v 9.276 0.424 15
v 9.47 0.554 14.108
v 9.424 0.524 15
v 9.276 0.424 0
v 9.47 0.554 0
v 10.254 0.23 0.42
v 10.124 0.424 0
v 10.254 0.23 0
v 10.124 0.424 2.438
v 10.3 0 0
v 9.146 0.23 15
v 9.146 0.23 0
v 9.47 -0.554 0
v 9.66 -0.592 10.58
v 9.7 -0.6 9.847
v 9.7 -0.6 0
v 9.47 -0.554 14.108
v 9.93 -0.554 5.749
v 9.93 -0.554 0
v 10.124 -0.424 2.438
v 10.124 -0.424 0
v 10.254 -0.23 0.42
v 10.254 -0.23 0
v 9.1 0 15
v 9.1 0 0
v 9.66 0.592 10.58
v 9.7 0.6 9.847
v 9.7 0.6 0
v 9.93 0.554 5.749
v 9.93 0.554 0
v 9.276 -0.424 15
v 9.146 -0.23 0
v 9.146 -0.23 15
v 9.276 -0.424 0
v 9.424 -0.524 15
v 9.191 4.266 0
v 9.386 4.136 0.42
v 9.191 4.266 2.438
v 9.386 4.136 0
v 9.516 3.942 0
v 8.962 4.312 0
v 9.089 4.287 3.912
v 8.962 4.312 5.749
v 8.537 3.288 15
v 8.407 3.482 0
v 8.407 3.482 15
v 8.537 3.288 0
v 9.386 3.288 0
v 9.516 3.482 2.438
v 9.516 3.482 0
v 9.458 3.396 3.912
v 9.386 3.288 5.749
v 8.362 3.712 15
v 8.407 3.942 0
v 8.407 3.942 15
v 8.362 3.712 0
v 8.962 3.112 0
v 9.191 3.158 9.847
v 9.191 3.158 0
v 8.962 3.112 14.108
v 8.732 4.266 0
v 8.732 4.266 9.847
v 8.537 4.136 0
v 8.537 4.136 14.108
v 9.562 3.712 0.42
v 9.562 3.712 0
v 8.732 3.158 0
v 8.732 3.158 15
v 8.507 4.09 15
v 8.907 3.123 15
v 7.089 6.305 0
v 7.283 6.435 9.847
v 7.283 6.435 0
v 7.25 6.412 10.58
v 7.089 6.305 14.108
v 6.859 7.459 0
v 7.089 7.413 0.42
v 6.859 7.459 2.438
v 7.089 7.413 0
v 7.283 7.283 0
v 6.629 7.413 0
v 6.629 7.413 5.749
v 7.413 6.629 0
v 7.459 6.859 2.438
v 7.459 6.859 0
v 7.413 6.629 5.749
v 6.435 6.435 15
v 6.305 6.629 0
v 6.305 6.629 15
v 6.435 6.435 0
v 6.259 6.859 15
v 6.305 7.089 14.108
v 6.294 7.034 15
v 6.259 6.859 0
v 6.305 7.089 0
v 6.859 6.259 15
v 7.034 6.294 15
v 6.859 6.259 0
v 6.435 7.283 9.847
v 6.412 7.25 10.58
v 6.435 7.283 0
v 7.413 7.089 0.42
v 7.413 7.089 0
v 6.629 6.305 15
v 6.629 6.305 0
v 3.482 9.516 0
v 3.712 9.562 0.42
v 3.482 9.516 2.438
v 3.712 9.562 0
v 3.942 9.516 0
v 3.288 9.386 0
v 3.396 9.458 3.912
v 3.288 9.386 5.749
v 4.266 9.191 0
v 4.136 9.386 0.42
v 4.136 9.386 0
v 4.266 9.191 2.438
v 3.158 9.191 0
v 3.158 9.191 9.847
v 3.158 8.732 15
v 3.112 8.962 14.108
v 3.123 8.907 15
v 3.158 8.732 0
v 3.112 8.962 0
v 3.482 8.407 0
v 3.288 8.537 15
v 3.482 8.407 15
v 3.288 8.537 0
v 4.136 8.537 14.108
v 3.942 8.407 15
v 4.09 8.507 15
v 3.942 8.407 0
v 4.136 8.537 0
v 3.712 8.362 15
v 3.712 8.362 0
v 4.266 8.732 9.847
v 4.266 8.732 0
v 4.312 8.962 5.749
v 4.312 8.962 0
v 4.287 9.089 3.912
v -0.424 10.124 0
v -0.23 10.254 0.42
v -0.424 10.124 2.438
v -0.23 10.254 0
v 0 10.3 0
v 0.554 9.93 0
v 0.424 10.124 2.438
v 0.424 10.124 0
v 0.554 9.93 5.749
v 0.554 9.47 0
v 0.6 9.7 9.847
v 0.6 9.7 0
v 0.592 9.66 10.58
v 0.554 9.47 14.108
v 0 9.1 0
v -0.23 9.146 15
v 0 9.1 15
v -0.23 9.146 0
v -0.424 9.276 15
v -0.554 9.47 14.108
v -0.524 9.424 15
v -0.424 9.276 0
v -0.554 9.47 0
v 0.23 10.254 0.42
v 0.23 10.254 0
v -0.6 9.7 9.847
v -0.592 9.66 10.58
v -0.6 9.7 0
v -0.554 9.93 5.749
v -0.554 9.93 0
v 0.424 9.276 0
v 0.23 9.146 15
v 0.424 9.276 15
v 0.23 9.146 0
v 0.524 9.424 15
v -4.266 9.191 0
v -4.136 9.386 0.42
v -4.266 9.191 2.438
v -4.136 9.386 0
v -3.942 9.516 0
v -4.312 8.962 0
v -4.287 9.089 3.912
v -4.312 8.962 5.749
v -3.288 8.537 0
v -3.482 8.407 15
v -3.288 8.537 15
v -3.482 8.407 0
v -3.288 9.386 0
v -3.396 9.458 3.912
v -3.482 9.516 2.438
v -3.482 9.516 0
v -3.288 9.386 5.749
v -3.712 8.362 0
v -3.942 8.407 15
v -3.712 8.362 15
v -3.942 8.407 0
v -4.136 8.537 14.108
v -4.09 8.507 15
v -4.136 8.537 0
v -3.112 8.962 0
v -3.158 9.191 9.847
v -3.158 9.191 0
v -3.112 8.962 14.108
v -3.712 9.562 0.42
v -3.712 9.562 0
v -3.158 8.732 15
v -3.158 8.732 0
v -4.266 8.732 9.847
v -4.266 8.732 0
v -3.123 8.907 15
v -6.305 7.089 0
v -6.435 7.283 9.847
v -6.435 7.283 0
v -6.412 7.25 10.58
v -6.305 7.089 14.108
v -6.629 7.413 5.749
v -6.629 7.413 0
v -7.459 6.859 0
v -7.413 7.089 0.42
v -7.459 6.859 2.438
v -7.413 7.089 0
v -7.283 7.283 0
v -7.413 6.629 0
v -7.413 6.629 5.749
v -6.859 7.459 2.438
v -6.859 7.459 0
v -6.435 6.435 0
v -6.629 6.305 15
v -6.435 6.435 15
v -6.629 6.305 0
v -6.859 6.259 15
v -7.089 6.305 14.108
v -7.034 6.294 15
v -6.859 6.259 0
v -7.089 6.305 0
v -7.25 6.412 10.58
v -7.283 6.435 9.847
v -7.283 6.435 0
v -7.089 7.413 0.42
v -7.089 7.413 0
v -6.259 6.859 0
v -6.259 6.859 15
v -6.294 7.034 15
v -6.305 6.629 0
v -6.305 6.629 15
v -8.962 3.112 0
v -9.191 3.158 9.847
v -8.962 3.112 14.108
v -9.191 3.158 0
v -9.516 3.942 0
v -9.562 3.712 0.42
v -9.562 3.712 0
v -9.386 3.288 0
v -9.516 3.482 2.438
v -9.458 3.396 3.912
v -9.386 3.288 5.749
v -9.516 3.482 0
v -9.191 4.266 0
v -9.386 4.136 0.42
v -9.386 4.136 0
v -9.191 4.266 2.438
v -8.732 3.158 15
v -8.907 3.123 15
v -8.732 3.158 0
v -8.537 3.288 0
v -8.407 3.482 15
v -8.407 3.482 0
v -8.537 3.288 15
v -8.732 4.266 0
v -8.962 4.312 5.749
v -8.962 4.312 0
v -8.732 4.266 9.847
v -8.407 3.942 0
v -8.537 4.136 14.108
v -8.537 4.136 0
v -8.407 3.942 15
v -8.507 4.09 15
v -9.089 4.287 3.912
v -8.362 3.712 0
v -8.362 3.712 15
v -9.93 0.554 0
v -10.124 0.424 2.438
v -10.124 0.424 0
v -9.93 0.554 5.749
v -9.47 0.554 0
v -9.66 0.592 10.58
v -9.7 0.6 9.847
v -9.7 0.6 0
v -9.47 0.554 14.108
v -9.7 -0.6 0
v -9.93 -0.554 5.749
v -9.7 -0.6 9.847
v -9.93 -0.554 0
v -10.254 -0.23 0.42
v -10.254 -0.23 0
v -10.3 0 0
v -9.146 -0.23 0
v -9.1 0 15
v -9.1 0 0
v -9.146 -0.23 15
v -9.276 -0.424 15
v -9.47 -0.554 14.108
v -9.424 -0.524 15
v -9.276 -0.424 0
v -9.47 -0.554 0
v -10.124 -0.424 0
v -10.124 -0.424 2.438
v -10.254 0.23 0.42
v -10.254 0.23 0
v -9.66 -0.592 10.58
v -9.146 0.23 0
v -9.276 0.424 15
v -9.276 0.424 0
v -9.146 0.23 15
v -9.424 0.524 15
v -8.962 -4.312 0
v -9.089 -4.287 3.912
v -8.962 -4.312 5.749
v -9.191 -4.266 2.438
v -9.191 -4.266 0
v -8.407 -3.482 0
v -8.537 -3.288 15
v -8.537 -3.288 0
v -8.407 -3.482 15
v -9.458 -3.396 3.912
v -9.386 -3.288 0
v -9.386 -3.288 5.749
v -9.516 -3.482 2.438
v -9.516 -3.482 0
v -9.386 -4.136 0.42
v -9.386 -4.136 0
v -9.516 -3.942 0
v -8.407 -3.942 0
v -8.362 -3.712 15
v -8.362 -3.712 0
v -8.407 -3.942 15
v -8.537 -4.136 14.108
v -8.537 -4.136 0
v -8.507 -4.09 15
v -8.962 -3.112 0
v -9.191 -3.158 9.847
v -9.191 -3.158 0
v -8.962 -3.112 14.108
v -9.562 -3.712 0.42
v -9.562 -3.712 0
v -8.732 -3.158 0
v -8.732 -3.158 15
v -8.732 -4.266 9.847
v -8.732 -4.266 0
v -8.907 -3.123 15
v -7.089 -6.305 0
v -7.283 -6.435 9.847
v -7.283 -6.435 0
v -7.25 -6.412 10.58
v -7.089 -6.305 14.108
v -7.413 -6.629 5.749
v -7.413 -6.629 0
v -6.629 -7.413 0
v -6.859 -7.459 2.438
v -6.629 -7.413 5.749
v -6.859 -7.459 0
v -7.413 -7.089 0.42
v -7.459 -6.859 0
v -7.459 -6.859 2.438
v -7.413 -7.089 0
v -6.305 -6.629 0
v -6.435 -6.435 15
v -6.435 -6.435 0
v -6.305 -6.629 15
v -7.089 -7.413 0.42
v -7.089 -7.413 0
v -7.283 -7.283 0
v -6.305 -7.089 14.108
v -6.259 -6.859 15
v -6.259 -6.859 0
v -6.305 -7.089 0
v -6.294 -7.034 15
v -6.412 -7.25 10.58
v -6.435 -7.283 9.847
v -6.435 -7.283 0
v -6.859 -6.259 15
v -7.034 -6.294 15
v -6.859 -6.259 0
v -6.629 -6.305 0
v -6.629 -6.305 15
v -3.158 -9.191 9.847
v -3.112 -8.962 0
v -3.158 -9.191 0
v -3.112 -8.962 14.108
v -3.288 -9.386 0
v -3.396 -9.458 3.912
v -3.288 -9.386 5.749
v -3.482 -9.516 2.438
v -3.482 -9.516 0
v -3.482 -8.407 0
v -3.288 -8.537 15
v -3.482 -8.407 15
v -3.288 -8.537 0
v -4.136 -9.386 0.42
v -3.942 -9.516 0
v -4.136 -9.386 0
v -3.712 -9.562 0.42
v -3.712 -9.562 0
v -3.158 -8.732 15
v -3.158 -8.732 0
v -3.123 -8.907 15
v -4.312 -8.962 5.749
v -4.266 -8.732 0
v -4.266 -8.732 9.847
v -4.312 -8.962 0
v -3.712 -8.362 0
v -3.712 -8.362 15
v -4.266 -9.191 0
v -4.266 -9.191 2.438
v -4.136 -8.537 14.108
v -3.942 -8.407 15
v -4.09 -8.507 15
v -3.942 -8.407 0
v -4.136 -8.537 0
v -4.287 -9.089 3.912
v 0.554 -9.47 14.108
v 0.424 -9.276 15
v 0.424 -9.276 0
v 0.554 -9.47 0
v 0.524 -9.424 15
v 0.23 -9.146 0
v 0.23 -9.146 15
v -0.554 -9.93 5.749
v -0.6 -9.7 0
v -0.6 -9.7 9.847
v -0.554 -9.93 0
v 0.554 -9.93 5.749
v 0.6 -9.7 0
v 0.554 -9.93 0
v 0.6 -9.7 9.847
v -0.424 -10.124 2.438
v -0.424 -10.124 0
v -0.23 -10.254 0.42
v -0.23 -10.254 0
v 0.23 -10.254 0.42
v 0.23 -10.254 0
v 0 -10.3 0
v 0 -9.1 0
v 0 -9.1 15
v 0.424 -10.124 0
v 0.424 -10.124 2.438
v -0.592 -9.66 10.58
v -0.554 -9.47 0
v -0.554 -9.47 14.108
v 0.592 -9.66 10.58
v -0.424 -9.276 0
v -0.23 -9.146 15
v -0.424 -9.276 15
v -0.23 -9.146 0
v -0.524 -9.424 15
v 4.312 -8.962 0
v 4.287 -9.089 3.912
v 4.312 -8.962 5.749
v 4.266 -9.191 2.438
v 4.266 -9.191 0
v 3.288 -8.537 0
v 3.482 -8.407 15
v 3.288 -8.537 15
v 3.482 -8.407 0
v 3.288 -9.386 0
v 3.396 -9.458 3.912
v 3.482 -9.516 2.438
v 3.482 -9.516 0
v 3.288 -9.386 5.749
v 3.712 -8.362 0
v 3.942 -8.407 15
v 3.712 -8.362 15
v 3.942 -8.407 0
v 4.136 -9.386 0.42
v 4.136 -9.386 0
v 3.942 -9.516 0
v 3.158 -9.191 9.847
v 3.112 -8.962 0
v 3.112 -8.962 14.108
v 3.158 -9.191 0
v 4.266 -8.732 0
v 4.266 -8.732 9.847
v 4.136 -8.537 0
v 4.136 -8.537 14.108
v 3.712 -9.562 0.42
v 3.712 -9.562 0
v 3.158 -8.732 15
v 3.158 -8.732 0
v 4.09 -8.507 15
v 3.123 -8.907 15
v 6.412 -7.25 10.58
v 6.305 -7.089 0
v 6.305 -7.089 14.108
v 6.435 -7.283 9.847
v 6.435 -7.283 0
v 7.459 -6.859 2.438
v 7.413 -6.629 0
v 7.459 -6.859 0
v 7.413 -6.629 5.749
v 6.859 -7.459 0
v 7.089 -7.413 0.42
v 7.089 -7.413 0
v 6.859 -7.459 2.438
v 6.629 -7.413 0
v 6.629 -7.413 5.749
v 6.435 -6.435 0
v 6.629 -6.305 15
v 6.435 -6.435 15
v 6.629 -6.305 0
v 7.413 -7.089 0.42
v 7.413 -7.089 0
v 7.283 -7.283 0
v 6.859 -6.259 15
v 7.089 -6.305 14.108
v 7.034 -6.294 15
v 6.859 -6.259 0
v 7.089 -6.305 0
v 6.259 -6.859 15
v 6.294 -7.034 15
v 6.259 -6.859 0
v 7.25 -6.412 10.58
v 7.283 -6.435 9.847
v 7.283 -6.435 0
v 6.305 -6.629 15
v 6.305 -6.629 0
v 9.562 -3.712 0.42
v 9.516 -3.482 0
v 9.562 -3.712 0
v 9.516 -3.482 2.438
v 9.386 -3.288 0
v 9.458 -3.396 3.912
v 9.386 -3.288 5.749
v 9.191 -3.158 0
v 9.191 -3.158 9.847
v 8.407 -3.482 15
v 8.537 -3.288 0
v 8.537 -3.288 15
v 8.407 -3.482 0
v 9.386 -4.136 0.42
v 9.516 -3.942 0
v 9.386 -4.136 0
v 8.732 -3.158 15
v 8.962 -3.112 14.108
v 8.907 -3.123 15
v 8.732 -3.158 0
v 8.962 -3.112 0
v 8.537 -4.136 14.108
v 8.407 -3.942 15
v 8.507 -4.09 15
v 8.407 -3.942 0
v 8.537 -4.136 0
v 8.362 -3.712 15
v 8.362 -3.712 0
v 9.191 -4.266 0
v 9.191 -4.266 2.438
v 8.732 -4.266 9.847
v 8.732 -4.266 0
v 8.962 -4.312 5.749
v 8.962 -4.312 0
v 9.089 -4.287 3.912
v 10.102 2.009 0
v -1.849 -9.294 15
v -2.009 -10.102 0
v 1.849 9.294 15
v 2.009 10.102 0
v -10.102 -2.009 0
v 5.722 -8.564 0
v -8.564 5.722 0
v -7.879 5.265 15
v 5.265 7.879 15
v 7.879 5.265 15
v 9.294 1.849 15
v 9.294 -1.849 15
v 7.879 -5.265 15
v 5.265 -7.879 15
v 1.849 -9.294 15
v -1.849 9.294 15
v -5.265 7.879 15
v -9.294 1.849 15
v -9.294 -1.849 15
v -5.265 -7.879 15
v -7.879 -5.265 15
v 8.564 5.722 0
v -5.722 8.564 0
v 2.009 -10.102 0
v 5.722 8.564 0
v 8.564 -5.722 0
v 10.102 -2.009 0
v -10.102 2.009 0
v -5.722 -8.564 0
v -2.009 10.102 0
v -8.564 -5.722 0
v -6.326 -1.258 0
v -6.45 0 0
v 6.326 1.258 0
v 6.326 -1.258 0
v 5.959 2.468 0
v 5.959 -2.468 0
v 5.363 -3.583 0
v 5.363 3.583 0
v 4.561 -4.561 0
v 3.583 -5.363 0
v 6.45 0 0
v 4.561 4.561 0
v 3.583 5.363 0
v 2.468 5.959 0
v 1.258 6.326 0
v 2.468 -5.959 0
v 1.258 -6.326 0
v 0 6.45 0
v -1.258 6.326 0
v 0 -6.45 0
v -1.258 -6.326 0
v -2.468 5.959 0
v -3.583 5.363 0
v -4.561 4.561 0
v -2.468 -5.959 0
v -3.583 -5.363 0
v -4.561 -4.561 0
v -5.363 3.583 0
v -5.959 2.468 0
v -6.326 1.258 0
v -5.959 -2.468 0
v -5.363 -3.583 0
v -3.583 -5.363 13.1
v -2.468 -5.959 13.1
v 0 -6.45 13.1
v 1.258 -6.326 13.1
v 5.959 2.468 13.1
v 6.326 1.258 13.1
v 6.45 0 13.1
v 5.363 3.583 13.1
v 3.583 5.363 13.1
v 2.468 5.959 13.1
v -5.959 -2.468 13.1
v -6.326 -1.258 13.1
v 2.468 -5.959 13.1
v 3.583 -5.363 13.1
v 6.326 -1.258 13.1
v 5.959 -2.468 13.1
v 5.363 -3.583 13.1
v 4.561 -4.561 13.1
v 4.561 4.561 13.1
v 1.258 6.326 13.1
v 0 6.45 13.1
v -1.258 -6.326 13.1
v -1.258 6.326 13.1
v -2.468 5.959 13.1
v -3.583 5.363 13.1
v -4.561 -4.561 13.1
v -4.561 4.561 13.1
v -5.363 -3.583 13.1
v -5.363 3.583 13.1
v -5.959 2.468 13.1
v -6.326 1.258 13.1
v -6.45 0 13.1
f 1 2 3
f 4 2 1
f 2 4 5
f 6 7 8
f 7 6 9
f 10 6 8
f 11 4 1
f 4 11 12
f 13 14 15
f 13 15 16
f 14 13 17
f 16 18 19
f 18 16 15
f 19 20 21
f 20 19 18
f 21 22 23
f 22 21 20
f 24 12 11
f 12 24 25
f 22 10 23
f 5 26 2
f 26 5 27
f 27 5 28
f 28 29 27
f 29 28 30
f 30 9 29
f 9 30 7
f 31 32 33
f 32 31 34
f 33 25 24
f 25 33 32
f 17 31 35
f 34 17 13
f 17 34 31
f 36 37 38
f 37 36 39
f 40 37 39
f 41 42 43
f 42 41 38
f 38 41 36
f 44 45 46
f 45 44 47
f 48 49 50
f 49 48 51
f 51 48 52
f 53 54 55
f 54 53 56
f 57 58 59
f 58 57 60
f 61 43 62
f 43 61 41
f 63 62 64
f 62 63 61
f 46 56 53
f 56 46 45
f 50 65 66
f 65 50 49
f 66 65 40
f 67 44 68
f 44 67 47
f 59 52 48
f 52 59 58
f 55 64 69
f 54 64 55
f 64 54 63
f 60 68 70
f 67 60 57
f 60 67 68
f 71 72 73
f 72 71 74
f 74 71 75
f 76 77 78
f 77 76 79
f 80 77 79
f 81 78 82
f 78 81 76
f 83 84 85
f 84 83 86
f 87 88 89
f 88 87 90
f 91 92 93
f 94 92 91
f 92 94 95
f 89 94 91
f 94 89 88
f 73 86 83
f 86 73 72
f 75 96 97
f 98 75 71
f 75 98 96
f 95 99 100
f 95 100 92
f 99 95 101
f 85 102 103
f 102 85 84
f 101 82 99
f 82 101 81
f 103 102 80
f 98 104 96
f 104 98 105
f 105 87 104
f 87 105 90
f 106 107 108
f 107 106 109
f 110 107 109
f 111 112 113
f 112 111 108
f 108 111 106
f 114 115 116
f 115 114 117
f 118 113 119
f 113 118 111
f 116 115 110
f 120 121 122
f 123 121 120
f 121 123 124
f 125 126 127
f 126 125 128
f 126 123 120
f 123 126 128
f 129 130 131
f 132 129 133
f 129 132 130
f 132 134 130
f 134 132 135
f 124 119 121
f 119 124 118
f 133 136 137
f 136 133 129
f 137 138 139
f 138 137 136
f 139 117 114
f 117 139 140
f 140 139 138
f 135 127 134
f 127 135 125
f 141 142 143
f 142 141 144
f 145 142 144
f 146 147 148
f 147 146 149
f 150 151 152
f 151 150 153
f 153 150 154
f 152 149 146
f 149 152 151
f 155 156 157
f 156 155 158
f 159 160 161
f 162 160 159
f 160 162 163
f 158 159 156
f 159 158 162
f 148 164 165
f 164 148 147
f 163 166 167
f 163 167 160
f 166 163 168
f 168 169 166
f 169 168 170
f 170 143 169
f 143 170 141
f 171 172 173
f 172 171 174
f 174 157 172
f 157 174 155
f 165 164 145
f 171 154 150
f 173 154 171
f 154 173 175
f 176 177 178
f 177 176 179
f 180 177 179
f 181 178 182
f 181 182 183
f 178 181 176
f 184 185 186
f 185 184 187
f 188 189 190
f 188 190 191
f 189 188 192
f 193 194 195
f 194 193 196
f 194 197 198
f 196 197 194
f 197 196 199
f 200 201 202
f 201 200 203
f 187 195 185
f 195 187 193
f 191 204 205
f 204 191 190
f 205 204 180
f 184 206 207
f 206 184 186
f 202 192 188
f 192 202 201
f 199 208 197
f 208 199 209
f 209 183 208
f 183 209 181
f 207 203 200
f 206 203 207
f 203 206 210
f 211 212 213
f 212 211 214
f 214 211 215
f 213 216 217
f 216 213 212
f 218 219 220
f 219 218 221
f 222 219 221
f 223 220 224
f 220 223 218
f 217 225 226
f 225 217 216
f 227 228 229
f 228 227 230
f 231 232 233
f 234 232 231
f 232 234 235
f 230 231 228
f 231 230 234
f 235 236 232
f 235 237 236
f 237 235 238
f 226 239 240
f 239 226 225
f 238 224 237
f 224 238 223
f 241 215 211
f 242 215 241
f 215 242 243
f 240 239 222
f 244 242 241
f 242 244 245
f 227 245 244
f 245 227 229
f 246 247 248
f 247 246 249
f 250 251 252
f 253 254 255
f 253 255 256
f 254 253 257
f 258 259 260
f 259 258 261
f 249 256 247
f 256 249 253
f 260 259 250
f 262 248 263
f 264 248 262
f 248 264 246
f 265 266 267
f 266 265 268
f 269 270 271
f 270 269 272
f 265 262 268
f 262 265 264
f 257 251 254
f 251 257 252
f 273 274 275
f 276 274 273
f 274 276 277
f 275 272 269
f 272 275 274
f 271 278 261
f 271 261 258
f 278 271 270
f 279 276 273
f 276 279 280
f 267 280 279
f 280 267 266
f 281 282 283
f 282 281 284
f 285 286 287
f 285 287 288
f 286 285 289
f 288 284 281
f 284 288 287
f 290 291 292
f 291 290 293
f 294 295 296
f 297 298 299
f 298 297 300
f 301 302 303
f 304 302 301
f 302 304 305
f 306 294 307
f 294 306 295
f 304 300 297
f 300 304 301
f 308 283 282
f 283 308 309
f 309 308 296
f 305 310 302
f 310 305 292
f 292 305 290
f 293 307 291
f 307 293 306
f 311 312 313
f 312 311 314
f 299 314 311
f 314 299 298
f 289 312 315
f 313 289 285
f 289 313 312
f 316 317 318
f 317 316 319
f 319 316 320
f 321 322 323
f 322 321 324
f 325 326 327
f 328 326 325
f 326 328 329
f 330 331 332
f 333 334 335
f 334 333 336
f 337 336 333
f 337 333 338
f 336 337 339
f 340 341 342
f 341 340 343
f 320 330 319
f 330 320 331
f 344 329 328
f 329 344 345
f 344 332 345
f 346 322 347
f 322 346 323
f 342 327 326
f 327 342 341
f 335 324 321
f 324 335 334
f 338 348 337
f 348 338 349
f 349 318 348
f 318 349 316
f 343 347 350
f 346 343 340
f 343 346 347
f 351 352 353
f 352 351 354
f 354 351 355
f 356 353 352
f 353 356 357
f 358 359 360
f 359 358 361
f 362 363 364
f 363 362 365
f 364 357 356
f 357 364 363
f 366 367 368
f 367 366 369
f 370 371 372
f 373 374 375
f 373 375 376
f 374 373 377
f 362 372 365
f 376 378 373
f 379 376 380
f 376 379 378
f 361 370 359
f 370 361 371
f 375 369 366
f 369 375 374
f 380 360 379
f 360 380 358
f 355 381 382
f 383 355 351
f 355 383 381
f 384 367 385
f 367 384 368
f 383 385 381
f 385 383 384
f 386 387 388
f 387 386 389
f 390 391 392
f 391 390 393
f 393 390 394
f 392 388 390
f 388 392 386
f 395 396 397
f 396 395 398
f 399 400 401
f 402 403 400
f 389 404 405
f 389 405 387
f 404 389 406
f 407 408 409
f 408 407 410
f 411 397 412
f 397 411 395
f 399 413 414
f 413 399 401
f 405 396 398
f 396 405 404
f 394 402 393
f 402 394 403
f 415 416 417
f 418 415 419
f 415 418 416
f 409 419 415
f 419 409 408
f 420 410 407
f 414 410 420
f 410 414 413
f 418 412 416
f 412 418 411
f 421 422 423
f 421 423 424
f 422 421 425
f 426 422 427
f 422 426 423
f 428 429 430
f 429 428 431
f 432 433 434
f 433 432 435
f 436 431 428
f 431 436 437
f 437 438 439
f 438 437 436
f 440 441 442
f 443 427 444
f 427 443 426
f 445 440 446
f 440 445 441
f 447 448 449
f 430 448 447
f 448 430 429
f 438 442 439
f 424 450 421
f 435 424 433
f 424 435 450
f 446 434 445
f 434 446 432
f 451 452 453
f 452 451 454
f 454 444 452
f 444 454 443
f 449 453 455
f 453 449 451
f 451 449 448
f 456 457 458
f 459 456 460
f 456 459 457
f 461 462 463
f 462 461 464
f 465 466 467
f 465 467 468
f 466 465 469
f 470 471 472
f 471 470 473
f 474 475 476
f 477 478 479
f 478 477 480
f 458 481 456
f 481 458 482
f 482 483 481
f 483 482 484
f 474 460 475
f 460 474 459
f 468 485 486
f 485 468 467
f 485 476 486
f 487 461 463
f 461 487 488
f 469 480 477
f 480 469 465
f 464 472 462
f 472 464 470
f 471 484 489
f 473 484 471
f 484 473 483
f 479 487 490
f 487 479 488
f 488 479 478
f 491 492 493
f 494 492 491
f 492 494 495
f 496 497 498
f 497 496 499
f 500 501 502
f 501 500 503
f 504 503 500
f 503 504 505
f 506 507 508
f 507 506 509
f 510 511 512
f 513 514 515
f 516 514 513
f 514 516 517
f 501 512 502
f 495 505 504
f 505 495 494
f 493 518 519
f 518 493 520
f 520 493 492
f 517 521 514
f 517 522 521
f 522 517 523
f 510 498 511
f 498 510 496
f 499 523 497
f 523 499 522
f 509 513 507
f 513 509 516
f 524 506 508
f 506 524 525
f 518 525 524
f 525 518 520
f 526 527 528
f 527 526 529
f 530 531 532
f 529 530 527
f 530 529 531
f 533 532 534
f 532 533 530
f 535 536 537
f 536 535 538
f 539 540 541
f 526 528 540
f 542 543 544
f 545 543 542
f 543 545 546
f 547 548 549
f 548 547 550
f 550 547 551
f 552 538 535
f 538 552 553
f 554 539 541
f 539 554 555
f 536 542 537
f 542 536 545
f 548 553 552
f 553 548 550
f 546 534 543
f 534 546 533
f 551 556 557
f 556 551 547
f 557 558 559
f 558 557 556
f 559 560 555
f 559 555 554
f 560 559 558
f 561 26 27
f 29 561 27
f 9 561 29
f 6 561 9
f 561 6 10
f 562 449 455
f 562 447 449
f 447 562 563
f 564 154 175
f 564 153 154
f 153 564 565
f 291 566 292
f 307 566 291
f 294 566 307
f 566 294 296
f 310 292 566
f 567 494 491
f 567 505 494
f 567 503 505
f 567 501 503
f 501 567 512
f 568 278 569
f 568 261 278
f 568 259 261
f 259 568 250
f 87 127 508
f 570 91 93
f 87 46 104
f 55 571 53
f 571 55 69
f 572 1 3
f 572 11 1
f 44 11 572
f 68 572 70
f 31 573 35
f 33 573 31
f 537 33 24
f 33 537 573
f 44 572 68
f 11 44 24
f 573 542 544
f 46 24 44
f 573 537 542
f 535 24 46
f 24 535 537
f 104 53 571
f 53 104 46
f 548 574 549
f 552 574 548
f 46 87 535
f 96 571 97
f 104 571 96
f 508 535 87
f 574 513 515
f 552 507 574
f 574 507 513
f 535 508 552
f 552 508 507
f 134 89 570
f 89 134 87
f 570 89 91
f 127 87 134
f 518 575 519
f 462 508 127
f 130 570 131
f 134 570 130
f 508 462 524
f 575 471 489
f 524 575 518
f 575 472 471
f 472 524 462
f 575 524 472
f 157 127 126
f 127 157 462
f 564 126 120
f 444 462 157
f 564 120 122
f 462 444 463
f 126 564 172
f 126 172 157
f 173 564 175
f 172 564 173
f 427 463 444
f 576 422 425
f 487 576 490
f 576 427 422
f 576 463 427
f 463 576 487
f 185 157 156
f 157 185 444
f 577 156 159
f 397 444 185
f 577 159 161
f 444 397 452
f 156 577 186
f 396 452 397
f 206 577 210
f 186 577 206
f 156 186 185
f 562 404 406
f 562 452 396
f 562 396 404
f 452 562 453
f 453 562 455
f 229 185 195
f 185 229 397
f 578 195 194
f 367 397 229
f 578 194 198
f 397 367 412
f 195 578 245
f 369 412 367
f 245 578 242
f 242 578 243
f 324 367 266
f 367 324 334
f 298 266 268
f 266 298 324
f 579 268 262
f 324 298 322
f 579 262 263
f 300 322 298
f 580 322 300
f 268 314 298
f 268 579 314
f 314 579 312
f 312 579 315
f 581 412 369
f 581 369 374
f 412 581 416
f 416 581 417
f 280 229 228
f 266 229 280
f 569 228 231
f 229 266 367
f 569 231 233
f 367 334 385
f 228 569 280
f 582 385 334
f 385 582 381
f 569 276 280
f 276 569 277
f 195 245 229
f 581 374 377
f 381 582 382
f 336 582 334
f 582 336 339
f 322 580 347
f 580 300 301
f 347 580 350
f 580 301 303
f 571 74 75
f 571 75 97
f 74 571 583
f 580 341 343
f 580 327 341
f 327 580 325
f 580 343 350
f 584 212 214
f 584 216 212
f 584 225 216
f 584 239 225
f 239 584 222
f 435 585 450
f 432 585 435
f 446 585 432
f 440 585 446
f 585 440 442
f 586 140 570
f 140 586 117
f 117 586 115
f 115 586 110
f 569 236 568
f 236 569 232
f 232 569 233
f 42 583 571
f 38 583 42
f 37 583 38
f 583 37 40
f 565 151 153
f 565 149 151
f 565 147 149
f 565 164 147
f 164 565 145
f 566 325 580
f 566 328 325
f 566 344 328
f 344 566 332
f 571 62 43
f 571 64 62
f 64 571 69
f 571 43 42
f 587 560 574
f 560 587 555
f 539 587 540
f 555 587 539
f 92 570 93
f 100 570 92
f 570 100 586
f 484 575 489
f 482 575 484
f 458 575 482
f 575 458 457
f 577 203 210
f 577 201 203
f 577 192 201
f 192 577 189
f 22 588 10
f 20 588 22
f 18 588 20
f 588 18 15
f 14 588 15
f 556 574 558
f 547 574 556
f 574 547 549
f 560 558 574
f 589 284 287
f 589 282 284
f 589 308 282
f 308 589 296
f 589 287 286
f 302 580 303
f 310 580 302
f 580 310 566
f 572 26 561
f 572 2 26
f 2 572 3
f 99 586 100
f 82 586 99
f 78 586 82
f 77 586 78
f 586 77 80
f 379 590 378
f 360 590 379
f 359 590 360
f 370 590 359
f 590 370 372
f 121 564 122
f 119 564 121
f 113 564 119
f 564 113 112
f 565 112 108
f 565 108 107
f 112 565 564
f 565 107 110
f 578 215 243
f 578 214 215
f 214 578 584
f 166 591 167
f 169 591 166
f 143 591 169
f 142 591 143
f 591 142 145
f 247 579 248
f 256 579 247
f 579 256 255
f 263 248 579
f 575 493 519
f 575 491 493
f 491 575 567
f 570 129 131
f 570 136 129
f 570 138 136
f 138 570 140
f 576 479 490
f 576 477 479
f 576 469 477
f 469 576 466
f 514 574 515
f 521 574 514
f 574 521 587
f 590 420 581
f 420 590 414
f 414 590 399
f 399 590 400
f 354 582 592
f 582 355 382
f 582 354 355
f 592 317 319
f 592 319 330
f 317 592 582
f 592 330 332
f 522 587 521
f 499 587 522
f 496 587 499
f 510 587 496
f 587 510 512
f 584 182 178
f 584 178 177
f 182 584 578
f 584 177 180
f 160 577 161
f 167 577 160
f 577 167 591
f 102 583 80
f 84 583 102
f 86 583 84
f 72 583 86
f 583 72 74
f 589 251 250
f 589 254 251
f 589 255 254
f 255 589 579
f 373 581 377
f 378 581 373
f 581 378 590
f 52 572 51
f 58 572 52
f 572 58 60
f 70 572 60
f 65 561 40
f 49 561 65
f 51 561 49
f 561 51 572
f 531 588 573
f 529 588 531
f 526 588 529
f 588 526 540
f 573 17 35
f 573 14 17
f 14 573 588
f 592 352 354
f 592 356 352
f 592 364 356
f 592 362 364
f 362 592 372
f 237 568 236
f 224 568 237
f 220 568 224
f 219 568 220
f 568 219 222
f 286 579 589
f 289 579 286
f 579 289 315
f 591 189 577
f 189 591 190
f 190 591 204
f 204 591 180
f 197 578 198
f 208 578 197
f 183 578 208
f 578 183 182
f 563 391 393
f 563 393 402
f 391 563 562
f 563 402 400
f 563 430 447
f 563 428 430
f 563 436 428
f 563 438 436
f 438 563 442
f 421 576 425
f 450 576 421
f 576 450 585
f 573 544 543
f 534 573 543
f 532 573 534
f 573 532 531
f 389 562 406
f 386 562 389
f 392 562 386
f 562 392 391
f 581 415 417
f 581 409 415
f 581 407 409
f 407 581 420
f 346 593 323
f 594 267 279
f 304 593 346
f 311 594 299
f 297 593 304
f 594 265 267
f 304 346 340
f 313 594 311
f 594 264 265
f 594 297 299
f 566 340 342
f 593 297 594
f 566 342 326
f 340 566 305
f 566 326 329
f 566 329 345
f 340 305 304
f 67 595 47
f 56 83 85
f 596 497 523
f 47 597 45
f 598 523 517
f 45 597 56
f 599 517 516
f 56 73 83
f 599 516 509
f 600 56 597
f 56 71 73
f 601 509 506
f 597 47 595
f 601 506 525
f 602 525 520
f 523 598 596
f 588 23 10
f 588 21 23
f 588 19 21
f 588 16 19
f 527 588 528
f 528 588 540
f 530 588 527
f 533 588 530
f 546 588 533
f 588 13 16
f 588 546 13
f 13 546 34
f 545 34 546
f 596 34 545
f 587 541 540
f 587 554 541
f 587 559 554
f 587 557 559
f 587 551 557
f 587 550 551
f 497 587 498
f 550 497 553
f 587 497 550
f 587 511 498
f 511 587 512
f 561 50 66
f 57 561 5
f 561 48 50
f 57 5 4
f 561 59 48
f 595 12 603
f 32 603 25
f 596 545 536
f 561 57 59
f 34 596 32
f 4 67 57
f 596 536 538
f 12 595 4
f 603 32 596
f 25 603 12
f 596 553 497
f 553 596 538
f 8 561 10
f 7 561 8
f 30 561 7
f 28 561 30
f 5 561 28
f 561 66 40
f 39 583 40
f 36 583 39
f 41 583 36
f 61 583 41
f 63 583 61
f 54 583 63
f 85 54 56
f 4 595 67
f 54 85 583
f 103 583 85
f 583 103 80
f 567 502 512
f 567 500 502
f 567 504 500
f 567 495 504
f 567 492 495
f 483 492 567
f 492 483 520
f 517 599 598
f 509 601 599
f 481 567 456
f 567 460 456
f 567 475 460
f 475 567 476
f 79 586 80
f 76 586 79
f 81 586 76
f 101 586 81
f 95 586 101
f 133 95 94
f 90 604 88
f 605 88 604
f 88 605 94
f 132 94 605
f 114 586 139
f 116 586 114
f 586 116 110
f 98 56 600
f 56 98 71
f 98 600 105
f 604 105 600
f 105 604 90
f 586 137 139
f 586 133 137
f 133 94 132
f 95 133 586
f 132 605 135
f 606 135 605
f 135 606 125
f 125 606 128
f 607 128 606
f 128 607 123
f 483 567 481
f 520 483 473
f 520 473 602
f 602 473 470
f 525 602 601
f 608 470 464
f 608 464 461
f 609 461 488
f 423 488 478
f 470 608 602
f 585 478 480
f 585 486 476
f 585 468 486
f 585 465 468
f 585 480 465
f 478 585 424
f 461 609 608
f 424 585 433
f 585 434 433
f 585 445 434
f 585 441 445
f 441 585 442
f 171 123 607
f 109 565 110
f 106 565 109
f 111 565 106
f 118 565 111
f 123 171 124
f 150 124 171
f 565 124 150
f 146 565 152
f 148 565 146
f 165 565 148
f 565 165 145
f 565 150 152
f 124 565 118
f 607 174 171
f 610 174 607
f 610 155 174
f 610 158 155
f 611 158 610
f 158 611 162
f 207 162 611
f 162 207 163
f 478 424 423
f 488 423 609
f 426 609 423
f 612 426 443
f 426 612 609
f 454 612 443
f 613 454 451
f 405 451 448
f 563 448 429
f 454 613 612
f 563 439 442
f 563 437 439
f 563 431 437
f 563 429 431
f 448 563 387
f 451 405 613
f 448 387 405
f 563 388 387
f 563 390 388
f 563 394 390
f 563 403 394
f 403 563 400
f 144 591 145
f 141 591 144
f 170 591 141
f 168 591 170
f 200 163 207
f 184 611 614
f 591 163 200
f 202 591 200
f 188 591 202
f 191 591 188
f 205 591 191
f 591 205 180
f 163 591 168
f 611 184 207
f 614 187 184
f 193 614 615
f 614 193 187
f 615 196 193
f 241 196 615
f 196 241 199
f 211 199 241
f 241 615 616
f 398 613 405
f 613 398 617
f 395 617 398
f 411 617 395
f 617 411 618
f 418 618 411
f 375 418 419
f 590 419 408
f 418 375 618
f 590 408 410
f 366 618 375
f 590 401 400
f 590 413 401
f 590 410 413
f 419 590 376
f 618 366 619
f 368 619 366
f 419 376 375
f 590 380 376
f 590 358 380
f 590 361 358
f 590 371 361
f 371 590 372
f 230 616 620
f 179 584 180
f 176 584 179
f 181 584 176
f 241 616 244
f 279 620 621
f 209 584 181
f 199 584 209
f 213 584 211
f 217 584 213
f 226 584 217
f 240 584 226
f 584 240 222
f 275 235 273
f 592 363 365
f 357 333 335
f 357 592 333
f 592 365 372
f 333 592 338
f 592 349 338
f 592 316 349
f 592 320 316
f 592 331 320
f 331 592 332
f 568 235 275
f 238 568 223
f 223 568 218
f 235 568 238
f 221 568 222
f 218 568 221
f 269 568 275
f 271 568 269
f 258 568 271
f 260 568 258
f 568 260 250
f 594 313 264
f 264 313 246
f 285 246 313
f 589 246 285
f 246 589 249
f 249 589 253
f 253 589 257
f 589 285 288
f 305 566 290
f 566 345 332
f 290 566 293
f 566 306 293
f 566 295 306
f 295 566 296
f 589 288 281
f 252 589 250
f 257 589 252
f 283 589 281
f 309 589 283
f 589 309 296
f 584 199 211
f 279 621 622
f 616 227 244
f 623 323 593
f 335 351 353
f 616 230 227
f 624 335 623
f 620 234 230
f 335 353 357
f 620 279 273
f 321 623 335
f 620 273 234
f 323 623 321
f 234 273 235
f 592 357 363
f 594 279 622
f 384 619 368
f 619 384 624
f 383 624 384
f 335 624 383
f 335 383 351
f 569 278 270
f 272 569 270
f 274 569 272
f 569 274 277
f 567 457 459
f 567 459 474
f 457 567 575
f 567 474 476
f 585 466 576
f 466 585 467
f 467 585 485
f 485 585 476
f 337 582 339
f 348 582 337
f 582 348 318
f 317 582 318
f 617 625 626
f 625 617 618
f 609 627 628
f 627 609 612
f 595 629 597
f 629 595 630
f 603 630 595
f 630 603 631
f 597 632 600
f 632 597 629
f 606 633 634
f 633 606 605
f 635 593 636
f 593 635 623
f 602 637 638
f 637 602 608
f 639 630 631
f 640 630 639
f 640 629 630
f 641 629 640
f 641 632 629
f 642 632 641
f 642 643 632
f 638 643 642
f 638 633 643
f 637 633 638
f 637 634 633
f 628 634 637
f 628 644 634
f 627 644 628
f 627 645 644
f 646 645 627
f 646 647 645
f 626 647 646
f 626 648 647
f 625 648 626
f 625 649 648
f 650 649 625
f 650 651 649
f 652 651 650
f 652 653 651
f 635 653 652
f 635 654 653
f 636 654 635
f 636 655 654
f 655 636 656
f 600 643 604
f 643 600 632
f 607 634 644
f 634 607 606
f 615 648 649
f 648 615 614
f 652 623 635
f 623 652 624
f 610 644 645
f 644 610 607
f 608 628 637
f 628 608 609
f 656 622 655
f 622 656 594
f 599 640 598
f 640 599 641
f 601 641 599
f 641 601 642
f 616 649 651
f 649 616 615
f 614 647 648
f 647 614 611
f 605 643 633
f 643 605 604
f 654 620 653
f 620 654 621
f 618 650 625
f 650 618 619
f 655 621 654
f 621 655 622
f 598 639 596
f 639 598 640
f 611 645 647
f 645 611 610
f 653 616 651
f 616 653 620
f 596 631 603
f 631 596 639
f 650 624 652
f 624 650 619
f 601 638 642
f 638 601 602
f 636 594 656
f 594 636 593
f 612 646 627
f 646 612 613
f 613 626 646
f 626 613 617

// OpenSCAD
// ACCESS KNOB — Din Sync RE-303 Parameter Knob (Slip-On Sleeve)
// Generated via CLI for Studio Knobs (Slip-On Sleeve)
module access_knob_re303_param_slipon() {
  outer_d = 20.6;
  height = 15;
  taper = 0.92;
  bore_d = 12.6;
  slot_h = 13;
  tex_depth = 1.2;
  tex_scale = 1.2;
  tex_count = 16;

  difference() {
    cylinder(h=height, d1=outer_d, d2=outer_d*taper, $fn=32);
    translate([0,0,-0.1]) cylinder(h=slot_h+0.2, d=bore_d + 0.3, $fn=32);
    for(i=[0:tex_count-1]) {
      rotate([0,0,i*(360/tex_count)])
        translate([outer_d/2-tex_depth/2, 0, height/2])
          cylinder(h=height*1.1, d=tex_scale, center=true, $fn=16);
    }
  }
}
access_knob_re303_param_slipon();
